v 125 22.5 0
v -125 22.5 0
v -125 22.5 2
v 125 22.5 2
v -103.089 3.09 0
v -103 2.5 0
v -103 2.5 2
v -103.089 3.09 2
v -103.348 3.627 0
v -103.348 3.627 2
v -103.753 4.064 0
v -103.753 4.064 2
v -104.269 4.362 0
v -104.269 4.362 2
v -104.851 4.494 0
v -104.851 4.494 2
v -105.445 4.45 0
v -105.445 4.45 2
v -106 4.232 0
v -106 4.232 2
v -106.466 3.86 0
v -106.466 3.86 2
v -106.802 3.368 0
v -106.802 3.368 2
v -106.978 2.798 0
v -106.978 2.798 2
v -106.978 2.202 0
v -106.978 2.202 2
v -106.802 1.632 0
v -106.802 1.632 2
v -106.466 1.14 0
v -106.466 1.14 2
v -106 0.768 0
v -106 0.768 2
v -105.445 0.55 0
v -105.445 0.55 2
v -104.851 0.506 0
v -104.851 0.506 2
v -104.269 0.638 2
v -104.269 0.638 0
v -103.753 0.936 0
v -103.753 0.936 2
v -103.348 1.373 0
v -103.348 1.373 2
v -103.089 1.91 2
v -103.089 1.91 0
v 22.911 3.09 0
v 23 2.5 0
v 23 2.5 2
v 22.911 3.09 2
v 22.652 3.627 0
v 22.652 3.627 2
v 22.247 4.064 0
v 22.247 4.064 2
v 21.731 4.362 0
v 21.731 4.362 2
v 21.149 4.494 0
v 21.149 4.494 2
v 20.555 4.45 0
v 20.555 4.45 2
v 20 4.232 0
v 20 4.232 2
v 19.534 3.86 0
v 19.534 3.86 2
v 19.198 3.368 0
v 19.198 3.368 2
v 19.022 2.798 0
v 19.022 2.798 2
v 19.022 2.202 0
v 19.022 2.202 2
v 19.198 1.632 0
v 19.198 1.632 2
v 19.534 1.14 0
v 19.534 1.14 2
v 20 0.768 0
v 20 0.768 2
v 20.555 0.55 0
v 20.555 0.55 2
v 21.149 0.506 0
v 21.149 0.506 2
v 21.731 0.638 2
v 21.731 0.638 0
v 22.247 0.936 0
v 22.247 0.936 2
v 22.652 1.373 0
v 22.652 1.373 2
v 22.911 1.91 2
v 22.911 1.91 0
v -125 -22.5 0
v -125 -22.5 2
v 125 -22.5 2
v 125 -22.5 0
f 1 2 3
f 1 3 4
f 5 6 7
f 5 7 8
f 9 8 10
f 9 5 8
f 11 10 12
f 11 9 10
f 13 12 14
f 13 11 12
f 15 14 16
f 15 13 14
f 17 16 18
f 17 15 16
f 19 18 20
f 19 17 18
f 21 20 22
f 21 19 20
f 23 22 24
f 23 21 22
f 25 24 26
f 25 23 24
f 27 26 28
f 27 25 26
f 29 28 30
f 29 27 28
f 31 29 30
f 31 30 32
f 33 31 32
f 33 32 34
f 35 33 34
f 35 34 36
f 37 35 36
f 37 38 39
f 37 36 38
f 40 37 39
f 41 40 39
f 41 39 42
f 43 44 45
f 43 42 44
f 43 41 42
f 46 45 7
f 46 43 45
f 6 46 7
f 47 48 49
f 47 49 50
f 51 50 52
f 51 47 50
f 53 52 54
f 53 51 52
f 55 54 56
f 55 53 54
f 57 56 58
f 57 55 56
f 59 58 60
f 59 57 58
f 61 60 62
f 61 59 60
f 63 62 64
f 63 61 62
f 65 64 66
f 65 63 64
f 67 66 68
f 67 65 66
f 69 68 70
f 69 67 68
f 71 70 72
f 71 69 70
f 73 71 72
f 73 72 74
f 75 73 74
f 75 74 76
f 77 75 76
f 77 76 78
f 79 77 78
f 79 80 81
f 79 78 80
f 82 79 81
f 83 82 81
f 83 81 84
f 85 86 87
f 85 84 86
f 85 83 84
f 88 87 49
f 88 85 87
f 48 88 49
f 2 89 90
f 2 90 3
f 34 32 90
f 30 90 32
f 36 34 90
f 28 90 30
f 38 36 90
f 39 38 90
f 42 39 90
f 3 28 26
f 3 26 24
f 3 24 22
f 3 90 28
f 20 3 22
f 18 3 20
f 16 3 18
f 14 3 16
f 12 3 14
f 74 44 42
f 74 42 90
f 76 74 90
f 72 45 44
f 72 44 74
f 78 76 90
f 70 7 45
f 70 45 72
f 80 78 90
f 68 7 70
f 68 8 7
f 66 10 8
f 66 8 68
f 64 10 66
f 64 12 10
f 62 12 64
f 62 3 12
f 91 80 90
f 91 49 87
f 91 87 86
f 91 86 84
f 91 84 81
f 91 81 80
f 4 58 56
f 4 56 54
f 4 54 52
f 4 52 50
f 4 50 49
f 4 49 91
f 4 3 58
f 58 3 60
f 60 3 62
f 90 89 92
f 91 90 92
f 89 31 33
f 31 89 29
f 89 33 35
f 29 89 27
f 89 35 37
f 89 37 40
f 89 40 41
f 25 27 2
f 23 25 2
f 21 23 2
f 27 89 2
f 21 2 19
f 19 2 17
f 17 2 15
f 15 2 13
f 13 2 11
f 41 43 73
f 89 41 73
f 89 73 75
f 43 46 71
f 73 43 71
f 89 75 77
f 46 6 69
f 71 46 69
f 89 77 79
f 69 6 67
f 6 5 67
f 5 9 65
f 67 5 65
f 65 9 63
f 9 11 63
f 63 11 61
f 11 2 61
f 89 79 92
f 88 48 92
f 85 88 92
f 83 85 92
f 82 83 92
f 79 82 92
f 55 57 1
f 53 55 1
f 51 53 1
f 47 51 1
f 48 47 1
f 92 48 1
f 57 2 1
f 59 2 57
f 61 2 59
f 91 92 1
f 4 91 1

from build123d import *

# Parameters (mm, degrees)
SKETCH1_W               = 250
SKETCH1_H               = 45
BOSS_EXTRUDE1_DEPTH     = 2
CUT_EXTRUDE2_DEPTH      = 128.024603916
CUT_EXTRUDE2_DEPTH_BACK = 2
SKETCH2_R               = 2


with BuildPart() as part:
    # Sketch1 → Boss-Extrude1 (new body)
    with BuildSketch(Plane.XY):
        Rectangle(SKETCH1_W, SKETCH1_H)
    extrude(amount=BOSS_EXTRUDE1_DEPTH)

    # Sketch2 → Cut-Extrude2 (cut, two sides: drawn at the far end of the back side and taken through both)
    with BuildSketch(Plane.XY.offset(-CUT_EXTRUDE2_DEPTH_BACK)):
        with Locations((-105, 2.5)):
            Circle(SKETCH2_R)
        with Locations((21, 2.5)):
            Circle(SKETCH2_R)
    extrude(amount=CUT_EXTRUDE2_DEPTH + CUT_EXTRUDE2_DEPTH_BACK, mode=Mode.SUBTRACT)


solid = part.part
